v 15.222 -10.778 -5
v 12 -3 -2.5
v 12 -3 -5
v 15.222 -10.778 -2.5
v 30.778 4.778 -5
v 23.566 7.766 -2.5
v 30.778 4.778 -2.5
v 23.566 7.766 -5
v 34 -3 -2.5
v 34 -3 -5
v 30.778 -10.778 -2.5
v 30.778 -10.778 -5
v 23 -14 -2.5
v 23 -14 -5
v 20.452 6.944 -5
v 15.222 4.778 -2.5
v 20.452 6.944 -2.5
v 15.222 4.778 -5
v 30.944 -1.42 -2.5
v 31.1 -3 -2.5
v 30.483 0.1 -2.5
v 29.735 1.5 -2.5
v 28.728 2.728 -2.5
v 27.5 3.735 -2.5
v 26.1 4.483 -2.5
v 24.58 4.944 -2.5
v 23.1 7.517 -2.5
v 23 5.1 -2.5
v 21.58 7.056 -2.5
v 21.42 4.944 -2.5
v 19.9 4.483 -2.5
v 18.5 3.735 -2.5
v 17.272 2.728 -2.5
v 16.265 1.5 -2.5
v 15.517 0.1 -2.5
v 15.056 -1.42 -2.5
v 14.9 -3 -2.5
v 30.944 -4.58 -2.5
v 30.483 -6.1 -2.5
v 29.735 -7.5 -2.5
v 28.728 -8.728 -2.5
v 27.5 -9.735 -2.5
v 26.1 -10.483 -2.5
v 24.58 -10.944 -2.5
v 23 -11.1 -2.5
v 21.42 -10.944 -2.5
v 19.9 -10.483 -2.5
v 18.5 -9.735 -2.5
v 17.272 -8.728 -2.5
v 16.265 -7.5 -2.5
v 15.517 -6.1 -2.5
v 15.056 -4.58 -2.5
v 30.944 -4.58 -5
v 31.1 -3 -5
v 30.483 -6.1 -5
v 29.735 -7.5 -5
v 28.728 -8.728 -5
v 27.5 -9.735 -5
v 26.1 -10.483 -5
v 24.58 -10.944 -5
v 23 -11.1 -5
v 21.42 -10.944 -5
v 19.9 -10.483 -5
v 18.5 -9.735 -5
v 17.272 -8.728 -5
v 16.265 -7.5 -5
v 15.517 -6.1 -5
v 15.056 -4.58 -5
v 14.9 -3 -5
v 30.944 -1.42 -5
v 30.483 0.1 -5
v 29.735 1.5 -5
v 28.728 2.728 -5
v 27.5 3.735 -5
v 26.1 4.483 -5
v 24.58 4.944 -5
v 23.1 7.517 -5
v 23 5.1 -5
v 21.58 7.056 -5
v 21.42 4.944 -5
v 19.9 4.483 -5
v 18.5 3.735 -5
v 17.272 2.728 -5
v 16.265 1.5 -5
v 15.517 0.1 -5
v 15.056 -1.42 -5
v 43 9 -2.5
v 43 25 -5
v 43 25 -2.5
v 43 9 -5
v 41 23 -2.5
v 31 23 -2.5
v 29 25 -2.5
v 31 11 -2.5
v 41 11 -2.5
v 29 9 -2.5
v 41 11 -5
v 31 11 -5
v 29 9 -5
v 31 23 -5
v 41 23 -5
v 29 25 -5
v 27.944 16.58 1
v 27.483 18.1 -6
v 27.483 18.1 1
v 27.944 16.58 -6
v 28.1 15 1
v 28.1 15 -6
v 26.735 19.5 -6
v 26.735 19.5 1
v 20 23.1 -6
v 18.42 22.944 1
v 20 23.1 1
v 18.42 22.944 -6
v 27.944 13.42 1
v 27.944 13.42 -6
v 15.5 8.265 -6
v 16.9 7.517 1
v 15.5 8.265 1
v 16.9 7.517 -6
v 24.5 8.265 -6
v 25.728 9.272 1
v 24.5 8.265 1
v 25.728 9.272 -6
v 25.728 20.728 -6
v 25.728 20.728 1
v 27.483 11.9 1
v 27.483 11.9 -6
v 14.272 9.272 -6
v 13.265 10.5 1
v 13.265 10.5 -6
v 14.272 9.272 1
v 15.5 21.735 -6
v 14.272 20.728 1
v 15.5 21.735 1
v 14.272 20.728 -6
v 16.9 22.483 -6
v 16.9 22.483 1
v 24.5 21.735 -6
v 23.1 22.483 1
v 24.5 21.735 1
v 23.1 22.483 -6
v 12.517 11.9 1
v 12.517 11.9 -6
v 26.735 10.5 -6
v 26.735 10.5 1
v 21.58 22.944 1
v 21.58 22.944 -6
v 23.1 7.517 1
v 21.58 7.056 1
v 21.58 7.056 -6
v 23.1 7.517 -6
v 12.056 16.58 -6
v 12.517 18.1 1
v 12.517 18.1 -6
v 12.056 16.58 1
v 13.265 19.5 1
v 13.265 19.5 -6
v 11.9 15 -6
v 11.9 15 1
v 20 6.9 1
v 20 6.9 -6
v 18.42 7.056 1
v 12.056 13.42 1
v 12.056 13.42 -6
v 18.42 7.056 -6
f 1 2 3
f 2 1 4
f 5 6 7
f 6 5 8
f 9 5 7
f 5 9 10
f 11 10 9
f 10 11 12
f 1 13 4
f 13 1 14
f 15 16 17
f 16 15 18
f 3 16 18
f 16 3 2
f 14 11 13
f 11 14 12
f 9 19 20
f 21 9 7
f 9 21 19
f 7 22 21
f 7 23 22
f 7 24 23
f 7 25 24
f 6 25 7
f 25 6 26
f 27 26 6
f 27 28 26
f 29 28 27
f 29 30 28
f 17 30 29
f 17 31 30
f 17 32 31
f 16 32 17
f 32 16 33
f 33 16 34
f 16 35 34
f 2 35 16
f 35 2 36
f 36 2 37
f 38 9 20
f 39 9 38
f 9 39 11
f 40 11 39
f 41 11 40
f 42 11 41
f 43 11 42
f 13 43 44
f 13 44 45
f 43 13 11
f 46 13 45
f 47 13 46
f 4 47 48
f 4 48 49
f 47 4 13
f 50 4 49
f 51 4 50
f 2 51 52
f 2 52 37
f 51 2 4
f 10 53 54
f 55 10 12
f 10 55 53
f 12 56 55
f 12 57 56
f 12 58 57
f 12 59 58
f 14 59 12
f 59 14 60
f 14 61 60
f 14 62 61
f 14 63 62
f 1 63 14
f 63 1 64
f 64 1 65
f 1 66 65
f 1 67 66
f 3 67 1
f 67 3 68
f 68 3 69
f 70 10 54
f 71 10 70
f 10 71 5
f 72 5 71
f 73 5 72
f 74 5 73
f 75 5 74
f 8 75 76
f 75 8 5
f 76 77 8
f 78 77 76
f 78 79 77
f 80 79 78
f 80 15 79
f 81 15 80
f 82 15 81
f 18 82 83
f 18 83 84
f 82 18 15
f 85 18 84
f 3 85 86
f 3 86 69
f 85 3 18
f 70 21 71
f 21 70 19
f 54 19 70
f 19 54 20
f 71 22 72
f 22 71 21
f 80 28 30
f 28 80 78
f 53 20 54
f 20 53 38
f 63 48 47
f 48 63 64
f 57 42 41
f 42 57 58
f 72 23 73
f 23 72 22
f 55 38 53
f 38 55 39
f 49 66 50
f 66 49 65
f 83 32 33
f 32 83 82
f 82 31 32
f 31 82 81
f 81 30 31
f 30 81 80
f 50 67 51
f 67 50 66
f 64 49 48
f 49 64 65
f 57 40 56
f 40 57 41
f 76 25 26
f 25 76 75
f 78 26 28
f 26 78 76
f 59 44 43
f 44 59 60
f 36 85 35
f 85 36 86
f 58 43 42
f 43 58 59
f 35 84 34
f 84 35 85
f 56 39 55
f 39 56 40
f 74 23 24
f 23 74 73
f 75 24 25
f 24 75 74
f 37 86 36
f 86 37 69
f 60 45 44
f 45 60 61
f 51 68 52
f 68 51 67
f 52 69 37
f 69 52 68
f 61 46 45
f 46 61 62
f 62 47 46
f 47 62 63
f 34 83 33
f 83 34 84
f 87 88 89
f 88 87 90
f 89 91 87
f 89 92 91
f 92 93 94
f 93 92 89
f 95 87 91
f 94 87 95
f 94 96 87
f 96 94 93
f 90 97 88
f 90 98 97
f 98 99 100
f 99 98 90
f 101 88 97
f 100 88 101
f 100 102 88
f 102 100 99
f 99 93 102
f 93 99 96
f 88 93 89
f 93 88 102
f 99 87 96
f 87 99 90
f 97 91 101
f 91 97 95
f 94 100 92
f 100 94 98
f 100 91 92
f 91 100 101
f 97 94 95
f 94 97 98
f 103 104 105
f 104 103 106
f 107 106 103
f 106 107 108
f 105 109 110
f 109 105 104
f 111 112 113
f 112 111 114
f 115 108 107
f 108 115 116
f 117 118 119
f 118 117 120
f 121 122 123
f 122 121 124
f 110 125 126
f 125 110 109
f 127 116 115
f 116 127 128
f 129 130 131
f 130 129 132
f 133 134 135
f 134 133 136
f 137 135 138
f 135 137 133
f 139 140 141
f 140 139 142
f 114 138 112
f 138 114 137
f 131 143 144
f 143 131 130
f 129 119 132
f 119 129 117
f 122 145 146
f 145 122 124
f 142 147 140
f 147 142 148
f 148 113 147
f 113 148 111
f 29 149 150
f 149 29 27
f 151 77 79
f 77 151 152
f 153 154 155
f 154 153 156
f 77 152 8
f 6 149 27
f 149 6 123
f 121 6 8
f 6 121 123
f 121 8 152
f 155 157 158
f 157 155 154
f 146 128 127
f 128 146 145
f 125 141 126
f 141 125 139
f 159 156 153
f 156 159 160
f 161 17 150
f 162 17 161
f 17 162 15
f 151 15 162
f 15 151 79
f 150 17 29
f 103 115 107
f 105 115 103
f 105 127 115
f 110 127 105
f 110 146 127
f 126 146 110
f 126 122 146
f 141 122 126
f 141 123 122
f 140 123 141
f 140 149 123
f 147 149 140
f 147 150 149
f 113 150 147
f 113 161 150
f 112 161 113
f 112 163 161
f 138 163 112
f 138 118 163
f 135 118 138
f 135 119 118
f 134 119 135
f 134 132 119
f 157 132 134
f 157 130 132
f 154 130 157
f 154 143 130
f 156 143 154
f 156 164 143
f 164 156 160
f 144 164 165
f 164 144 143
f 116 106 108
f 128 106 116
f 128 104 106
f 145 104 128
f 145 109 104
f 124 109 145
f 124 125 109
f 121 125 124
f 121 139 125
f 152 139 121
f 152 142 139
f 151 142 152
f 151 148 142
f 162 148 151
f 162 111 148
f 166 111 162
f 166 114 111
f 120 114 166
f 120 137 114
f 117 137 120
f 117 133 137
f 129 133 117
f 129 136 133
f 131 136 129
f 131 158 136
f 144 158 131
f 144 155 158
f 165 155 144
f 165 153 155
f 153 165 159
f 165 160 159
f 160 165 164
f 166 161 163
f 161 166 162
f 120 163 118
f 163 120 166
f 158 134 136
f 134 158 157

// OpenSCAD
module nutHolder(h = 5, slicer = false, thickness = 2) {
  if (slicer) {
    translate([0, 0, -1])
      cylinder(h + 2, 7.51, 7.51, $fn = 6);
  } else {
    difference() {
      cylinder(h, 7.51 + thickness, 7.51 + thickness, $fn = 6);
      
      translate([0, 0, -1])
        cylinder(h + 2, 7.51, 7.51, $fn = 6);
    }
  }
}

module compassHolder(h = 5, slicer = false, thickness = 2, $fn = 64) {
  if (slicer) {
    translate([0, 0, -1])
      cylinder(h + 2, 5.1, 5.1, $fn = $fn);
  } else {
    difference() {
      cylinder(h, 5.1 + thickness, 5.1 + thickness);
        translate([0, 0, .5])
          cylinder(h, 5.1, 5.1, $fn = $fn);
    }
  }
}

module boltHeadSlicer(h = 5, $fn = 32) {
  translate([0, 0, -1])
    cylinder(h + 2, 8.1, 8.1, $fn = $fn);
}

translate([20, 15, -5]) {
    *compassHolder();
    *nutHolder(5, false);
    boltHeadSlicer();
    

    
    // BOLT HEAD SIZE
    translate([3, -18, 0])
    difference() {
        cylinder(2.5, 11, 11, $fn = 8);
        translate([0, 0, -1])
            cylinder(4, 8.1, 8.1, $fn = 32);
    }
    
    // MOTOR HOLDER
    translate([9, -6, 0]) {
        difference() {
            cube([14, 16, 2.5]);
            translate([2, 2, -2])
                cube([10, 12, 10]);
        }
    }
}
